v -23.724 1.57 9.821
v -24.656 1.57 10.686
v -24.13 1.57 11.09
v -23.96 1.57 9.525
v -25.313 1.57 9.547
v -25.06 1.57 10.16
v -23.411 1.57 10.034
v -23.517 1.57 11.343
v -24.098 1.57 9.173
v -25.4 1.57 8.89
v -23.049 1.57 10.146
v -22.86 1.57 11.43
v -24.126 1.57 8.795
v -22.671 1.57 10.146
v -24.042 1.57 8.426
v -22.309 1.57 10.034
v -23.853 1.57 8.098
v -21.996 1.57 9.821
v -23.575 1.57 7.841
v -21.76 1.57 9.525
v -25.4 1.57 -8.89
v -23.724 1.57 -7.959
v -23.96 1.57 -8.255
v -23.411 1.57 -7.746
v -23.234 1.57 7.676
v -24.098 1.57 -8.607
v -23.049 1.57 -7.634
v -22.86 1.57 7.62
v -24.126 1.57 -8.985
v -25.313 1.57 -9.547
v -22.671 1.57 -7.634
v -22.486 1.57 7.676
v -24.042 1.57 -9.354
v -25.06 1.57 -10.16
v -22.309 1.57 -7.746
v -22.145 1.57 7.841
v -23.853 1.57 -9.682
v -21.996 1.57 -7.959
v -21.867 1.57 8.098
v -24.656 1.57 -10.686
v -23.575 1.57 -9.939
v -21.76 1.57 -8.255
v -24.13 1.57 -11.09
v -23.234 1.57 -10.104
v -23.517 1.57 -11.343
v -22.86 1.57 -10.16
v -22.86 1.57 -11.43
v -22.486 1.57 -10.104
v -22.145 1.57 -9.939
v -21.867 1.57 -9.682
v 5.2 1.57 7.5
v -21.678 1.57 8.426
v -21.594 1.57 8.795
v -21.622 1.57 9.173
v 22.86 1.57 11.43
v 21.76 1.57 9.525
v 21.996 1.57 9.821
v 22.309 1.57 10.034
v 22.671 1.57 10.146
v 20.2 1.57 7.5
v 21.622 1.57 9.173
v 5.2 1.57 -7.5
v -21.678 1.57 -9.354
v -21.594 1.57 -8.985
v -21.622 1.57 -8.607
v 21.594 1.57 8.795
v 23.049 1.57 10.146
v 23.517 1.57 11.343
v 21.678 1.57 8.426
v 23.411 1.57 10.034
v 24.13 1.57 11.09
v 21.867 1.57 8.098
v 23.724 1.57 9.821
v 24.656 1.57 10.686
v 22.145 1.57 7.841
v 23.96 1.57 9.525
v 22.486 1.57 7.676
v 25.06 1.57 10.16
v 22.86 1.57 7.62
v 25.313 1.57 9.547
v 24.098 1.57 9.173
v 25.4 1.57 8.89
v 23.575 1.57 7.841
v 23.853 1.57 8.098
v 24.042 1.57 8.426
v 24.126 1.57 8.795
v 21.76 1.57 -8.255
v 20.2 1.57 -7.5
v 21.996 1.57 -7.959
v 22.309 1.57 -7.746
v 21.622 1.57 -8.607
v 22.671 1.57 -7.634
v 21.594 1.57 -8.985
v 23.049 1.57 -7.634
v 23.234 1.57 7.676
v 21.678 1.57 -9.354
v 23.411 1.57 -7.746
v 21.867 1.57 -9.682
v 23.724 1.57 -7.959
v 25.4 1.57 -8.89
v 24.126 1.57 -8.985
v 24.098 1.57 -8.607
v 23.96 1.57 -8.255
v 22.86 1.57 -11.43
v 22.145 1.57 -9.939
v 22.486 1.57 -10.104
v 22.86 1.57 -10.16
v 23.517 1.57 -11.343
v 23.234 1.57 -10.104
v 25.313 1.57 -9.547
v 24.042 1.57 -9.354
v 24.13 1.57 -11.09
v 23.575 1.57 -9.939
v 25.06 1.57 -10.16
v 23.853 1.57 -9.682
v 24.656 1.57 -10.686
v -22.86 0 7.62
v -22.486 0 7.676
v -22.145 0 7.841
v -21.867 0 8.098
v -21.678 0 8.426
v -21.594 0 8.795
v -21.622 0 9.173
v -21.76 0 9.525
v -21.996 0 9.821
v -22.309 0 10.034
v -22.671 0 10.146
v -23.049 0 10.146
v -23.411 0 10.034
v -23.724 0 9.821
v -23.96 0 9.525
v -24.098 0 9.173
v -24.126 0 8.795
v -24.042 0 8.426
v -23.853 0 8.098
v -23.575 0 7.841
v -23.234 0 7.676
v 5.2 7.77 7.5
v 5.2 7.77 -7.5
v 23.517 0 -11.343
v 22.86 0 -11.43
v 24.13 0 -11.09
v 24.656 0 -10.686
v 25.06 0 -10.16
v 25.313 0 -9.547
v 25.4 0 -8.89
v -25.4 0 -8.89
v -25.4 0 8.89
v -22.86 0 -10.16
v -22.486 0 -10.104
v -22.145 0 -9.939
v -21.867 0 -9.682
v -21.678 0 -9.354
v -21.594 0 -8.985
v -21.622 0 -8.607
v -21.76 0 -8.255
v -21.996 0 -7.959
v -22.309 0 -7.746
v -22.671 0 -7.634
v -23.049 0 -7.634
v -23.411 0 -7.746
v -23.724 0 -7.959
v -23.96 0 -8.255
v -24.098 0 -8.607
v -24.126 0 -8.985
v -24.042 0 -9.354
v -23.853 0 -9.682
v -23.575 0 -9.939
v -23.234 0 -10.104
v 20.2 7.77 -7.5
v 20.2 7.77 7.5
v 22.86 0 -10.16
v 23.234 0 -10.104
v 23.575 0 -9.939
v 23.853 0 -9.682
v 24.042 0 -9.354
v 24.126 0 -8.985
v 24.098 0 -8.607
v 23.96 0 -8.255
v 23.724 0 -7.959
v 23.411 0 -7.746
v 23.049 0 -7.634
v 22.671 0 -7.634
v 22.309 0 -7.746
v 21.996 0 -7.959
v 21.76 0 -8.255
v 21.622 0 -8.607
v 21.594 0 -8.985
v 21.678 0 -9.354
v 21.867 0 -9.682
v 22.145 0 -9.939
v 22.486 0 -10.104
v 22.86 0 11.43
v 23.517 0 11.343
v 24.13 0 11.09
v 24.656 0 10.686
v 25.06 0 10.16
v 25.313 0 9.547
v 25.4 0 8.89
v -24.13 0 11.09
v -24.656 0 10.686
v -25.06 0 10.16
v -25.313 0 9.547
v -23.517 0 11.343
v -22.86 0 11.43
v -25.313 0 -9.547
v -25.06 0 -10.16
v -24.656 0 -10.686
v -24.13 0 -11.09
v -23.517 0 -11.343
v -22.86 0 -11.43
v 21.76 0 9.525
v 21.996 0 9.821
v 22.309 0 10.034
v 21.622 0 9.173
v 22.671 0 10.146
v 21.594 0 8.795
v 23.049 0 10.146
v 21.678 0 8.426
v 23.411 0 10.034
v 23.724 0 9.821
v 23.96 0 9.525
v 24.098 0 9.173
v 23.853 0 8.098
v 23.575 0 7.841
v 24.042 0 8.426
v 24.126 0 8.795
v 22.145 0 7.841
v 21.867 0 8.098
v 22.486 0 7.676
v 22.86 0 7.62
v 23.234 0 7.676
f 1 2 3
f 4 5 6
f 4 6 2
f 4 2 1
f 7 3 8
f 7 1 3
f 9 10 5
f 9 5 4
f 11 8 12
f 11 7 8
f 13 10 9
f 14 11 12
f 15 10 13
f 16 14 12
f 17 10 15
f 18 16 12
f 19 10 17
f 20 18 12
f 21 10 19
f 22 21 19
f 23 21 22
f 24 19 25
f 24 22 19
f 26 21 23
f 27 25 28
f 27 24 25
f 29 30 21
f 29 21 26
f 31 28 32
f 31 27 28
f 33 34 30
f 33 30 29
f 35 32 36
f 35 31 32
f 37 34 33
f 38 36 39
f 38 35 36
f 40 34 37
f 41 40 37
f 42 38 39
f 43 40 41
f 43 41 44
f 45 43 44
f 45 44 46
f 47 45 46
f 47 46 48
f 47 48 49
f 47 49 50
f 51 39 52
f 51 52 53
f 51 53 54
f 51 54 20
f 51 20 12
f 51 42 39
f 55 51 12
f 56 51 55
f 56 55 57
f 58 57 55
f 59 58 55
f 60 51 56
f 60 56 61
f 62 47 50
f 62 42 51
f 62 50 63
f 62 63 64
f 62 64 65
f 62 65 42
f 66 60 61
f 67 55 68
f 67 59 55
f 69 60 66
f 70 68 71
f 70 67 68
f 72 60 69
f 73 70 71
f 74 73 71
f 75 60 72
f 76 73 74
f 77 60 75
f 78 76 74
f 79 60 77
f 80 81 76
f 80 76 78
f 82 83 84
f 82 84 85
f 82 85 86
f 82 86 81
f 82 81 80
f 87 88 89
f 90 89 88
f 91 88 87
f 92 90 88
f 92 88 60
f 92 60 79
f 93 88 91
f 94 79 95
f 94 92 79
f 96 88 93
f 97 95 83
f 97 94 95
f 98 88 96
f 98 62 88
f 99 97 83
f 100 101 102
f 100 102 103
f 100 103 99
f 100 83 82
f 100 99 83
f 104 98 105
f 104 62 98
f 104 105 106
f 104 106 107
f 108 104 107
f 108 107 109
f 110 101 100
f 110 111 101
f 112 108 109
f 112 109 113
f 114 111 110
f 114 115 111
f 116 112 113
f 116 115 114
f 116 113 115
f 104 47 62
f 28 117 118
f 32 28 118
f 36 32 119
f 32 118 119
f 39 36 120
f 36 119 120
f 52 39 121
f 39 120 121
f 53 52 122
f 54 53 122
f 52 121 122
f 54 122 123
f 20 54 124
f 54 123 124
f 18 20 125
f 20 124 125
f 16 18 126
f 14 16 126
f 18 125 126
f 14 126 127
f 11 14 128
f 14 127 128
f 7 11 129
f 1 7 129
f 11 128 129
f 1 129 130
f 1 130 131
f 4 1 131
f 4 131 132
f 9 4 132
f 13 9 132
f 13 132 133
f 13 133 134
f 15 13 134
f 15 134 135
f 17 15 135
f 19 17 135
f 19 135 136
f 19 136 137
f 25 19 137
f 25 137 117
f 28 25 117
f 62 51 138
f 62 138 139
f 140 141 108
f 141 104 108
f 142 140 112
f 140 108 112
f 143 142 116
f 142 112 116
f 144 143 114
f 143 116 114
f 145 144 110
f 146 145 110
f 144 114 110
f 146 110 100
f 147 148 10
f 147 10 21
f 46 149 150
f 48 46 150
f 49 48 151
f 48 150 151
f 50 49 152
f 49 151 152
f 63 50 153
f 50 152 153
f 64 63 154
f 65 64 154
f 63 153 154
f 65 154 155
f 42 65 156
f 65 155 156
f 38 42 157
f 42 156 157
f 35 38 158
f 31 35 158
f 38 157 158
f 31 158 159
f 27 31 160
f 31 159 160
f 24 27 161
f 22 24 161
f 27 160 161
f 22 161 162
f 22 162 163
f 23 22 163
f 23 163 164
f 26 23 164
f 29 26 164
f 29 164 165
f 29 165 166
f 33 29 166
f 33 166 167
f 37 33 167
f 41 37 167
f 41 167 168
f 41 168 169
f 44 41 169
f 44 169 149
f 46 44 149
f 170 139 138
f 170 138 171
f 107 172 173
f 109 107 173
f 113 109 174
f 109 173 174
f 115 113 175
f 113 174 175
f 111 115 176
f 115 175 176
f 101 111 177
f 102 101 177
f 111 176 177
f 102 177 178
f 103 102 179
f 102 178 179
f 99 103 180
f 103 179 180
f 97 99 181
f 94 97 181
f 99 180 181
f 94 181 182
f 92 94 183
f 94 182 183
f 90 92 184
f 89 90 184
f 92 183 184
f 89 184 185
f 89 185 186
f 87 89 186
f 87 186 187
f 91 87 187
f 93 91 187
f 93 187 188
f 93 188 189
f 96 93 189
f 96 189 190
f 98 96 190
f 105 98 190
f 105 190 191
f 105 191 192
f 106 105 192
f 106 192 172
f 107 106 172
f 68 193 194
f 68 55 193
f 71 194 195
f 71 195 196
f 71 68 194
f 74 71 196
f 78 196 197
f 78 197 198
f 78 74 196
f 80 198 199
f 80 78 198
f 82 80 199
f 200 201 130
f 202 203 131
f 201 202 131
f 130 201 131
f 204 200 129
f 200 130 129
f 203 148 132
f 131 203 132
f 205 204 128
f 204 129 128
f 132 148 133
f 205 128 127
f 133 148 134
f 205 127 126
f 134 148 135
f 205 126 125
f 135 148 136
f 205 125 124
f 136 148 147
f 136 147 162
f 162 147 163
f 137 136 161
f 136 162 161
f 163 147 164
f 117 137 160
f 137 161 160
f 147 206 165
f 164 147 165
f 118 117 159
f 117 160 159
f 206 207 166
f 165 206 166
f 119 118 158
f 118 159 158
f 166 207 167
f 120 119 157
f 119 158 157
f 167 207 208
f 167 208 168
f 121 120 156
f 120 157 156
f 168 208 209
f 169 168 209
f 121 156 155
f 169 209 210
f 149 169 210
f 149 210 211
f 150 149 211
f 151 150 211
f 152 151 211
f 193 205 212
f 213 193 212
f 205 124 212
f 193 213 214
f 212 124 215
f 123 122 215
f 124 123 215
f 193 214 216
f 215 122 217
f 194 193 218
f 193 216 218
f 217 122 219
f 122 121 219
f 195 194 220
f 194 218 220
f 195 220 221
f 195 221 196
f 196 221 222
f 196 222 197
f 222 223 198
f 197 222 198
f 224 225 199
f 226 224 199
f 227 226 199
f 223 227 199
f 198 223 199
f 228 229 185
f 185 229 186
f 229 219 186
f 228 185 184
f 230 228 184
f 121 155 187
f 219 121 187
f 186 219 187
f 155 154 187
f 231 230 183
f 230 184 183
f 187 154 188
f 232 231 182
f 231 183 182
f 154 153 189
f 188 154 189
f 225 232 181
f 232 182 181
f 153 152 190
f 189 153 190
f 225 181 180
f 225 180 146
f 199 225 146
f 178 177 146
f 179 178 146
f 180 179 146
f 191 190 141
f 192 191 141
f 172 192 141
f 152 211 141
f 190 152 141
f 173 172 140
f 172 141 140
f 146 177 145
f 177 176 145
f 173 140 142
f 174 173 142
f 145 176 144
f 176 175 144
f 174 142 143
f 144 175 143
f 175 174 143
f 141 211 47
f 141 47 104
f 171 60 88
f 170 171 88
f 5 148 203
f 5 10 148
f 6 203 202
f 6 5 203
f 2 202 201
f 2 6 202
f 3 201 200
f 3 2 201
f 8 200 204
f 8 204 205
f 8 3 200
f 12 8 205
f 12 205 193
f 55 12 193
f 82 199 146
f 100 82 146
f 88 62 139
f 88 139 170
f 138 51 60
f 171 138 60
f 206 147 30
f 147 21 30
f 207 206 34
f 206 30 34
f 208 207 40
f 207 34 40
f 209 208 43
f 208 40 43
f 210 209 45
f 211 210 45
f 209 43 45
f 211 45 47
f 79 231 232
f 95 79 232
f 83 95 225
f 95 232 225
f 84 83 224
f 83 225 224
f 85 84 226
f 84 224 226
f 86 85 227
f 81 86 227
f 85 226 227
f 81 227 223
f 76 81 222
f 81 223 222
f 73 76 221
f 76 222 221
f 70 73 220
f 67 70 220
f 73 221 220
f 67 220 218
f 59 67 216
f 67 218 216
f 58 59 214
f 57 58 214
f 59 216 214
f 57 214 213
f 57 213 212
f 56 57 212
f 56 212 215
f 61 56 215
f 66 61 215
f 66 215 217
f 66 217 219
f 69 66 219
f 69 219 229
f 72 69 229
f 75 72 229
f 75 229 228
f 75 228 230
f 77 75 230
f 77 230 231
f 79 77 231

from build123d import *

# Parameters (mm, degrees)
SKETCH1_W                = 50.8
SKETCH1_H                = 22.86
BOSS_EXTRUDE1_DEPTH      = 1.57
F_1_16_0_1_DOWEL_HOLE1_D = 2.54
FILLET1_R                = 2.54
SKETCH2_W                = 15
SKETCH2_H                = 15
BOSS_EXTRUDE2_DEPTH      = 6.2


with BuildPart() as part:
    # Sketch1 → Boss-Extrude1 (new body)
    with BuildSketch(Plane(origin=(0, 0, 0), x_dir=(1, 0, 0), z_dir=(0, 1, 0))):
        Rectangle(SKETCH1_W, SKETCH1_H)
    extrude(amount=BOSS_EXTRUDE1_DEPTH)

    # 1/16 (0.1) Dowel Hole1 (through all)
    with Locations(Plane(origin=(-22.86, 1.57, -8.89), x_dir=(0, 0, 1), z_dir=(0, 1, 0))):
        with Locations((0, 0), (0, 45.72), (17.78, 45.72), (17.78, 0)):
            Hole(F_1_16_0_1_DOWEL_HOLE1_D / 2)

    # Fillet1
    fillet1_edges = [part.edges().sort_by_distance(p)[0] for p in [
        (25.4, 0.785, 11.43),
        (-25.4, 0.785, 11.43),
        (-25.4, 0.785, -11.43),
        (25.4, 0.785, -11.43),
    ]]
    fillet(fillet1_edges, radius=FILLET1_R)

    # Sketch2 → Boss-Extrude2 (add)
    with BuildSketch(Plane(origin=(0, 1.57, 0), x_dir=(1, 0, 0), z_dir=(0, 1, 0))):
        with Locations((12.7, 0)):
            Rectangle(SKETCH2_W, SKETCH2_H)
    extrude(amount=BOSS_EXTRUDE2_DEPTH)


solid = part.part
